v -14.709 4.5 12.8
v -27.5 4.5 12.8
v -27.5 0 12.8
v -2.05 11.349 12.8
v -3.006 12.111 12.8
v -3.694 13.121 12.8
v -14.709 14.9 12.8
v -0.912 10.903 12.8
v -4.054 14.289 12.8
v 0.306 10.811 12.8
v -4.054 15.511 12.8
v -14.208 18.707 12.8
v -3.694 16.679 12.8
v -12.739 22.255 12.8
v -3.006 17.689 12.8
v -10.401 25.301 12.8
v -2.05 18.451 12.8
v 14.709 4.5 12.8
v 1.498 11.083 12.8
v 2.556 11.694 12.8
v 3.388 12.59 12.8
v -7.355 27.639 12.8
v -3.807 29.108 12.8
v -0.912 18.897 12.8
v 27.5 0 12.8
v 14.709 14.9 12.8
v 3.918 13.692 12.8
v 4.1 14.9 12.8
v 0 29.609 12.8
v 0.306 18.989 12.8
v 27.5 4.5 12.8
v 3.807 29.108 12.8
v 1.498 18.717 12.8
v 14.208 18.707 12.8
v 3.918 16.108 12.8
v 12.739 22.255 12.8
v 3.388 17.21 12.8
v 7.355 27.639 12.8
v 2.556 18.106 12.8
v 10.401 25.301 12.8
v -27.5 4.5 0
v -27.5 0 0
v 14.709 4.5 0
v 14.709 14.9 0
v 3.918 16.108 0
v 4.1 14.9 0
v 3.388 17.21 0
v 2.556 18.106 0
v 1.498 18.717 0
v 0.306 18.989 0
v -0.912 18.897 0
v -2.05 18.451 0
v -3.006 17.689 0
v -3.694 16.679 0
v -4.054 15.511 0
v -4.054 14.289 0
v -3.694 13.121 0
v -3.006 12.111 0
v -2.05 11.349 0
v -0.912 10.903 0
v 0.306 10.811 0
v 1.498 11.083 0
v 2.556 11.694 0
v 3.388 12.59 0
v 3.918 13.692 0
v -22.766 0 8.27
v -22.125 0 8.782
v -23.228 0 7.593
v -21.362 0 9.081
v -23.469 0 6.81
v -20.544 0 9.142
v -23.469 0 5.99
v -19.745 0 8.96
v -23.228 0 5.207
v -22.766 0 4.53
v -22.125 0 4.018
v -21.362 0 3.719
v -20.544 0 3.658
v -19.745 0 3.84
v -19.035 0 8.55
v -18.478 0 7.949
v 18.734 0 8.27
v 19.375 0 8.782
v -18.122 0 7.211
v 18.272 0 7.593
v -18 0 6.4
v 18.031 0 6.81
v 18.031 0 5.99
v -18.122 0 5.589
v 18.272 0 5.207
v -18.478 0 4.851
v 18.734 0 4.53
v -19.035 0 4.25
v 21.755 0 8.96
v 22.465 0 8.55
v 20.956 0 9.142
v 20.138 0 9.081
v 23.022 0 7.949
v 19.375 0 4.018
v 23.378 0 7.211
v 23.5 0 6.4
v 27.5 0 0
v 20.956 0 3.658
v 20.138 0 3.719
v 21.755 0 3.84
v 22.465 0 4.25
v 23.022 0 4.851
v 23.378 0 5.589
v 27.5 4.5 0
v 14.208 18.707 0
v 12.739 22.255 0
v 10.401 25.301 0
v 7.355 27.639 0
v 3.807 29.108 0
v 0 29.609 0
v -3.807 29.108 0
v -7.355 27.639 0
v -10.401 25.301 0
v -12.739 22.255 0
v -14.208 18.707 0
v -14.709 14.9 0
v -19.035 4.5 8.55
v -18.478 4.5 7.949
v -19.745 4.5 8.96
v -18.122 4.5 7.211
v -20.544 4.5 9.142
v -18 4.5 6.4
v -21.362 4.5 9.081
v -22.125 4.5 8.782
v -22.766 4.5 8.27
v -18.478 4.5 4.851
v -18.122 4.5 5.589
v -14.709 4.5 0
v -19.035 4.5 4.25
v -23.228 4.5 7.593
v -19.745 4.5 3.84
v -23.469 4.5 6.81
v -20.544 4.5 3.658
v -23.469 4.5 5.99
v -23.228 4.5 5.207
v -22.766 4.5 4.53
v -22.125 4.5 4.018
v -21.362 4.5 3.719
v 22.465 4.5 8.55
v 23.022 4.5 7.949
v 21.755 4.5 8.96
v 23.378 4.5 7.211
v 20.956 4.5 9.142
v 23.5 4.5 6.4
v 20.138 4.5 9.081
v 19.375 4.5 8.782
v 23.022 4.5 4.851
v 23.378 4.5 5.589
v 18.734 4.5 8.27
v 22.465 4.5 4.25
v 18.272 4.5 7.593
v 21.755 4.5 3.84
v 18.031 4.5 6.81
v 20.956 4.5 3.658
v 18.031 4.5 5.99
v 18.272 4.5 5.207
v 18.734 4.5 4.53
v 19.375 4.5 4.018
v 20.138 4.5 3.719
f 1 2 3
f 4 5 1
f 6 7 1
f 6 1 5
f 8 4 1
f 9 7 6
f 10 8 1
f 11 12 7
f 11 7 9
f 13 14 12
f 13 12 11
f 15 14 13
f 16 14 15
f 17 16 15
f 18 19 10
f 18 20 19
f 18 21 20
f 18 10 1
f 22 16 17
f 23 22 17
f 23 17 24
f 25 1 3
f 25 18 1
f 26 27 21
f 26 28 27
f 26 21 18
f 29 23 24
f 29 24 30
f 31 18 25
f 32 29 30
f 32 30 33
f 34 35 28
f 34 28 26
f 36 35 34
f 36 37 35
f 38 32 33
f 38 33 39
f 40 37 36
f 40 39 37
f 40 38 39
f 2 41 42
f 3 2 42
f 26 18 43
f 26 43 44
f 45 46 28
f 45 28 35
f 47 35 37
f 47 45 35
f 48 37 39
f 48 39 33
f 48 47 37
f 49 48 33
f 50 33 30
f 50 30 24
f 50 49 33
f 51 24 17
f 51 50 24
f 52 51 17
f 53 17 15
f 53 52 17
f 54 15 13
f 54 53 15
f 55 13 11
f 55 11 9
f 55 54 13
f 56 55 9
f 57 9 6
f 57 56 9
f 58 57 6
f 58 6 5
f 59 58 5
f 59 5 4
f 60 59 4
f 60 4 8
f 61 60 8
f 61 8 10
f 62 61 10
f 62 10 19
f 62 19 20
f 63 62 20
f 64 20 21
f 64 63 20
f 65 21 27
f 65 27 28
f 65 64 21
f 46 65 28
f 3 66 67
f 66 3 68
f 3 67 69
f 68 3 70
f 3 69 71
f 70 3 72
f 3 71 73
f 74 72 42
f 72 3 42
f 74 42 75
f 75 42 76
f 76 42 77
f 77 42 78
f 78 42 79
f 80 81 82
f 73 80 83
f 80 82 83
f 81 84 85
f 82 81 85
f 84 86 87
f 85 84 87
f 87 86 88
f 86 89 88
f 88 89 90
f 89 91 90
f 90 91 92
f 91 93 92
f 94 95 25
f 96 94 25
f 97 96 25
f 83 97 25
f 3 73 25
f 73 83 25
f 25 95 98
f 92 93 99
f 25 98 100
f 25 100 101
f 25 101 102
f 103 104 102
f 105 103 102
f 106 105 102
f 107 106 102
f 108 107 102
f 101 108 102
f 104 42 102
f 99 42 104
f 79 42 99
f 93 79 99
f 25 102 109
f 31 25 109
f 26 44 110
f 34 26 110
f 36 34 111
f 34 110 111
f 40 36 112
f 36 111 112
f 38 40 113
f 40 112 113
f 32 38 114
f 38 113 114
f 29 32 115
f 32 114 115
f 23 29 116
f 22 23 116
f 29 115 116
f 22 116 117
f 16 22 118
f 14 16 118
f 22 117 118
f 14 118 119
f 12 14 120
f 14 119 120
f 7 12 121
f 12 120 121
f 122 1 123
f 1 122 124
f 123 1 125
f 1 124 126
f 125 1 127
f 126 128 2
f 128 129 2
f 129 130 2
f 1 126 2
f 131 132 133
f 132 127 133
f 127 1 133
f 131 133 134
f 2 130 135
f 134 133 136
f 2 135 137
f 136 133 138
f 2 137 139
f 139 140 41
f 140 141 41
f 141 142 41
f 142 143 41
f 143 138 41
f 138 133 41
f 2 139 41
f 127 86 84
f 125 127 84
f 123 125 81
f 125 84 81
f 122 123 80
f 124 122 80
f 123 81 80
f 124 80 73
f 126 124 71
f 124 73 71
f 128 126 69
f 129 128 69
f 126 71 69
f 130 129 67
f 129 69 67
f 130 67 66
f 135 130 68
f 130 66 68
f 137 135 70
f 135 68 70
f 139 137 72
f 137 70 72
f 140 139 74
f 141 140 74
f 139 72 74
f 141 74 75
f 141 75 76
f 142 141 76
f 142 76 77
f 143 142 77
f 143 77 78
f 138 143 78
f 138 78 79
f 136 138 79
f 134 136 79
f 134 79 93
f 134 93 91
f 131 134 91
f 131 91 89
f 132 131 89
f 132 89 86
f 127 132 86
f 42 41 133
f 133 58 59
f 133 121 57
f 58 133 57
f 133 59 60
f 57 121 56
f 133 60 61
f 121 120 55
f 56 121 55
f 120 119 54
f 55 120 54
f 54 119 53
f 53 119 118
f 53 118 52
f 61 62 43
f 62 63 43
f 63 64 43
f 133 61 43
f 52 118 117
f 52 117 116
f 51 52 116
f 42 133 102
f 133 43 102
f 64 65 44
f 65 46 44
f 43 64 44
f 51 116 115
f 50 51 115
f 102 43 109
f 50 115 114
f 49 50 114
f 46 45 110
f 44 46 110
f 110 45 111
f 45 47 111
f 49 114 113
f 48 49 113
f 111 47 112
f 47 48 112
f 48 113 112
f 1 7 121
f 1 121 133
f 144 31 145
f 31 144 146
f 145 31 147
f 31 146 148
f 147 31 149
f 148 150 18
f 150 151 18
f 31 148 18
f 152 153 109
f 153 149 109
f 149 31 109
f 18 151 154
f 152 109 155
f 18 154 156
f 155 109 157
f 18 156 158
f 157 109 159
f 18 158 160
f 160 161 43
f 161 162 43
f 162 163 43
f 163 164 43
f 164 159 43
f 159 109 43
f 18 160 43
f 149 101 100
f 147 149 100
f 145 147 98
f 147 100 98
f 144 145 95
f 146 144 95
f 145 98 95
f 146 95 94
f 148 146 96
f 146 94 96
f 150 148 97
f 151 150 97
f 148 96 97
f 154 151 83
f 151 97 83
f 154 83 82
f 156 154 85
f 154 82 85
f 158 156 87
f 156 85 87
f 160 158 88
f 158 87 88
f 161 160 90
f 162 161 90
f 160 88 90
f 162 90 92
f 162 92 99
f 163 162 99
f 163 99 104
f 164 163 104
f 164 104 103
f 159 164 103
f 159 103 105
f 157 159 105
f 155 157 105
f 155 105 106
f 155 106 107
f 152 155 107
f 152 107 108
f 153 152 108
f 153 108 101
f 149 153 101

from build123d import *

# Parameters (mm, degrees)
SKETCH1_R           = 4.1
BOSS_EXTRUDE1_DEPTH = 12.8
SKETCH2_R           = 2.75
CUT_EXTRUDE1_DEPTH  = 30.609218923


with BuildPart() as part:
    # Sketch1 → Boss-Extrude1 (new body)
    with BuildSketch(Plane.XY):
        with BuildLine():
            Line((-27.5, 4.5), (-27.5, 0))
            Line((-27.5, 0), (27.5, 0))
            Line((27.5, 0), (27.5, 4.5))
            Line((27.5, 4.5), (14.709218923, 4.5))
            Line((14.709218923, 4.5), (14.709218923, 14.9))
            ThreePointArc((14.709218923, 14.9), (0, 29.609218923), (-14.709218923, 14.9))
            Line((-14.709218923, 14.9), (-14.709218923, 4.5))
            Line((-14.709218923, 4.5), (-27.5, 4.5))
        make_face()
        with Locations((0, 14.9)):
            Circle(SKETCH1_R, mode=Mode.SUBTRACT)
    extrude(amount=BOSS_EXTRUDE1_DEPTH)

    # Sketch2 → Cut-Extrude1 (cut, through all)
    with BuildSketch(Plane.XZ):
        with Locations((-20.75, 6.4)):
            Circle(SKETCH2_R)
        with Locations((20.75, 6.4)):
            Circle(SKETCH2_R)
    extrude(amount=-CUT_EXTRUDE1_DEPTH, mode=Mode.SUBTRACT)


solid = part.part
